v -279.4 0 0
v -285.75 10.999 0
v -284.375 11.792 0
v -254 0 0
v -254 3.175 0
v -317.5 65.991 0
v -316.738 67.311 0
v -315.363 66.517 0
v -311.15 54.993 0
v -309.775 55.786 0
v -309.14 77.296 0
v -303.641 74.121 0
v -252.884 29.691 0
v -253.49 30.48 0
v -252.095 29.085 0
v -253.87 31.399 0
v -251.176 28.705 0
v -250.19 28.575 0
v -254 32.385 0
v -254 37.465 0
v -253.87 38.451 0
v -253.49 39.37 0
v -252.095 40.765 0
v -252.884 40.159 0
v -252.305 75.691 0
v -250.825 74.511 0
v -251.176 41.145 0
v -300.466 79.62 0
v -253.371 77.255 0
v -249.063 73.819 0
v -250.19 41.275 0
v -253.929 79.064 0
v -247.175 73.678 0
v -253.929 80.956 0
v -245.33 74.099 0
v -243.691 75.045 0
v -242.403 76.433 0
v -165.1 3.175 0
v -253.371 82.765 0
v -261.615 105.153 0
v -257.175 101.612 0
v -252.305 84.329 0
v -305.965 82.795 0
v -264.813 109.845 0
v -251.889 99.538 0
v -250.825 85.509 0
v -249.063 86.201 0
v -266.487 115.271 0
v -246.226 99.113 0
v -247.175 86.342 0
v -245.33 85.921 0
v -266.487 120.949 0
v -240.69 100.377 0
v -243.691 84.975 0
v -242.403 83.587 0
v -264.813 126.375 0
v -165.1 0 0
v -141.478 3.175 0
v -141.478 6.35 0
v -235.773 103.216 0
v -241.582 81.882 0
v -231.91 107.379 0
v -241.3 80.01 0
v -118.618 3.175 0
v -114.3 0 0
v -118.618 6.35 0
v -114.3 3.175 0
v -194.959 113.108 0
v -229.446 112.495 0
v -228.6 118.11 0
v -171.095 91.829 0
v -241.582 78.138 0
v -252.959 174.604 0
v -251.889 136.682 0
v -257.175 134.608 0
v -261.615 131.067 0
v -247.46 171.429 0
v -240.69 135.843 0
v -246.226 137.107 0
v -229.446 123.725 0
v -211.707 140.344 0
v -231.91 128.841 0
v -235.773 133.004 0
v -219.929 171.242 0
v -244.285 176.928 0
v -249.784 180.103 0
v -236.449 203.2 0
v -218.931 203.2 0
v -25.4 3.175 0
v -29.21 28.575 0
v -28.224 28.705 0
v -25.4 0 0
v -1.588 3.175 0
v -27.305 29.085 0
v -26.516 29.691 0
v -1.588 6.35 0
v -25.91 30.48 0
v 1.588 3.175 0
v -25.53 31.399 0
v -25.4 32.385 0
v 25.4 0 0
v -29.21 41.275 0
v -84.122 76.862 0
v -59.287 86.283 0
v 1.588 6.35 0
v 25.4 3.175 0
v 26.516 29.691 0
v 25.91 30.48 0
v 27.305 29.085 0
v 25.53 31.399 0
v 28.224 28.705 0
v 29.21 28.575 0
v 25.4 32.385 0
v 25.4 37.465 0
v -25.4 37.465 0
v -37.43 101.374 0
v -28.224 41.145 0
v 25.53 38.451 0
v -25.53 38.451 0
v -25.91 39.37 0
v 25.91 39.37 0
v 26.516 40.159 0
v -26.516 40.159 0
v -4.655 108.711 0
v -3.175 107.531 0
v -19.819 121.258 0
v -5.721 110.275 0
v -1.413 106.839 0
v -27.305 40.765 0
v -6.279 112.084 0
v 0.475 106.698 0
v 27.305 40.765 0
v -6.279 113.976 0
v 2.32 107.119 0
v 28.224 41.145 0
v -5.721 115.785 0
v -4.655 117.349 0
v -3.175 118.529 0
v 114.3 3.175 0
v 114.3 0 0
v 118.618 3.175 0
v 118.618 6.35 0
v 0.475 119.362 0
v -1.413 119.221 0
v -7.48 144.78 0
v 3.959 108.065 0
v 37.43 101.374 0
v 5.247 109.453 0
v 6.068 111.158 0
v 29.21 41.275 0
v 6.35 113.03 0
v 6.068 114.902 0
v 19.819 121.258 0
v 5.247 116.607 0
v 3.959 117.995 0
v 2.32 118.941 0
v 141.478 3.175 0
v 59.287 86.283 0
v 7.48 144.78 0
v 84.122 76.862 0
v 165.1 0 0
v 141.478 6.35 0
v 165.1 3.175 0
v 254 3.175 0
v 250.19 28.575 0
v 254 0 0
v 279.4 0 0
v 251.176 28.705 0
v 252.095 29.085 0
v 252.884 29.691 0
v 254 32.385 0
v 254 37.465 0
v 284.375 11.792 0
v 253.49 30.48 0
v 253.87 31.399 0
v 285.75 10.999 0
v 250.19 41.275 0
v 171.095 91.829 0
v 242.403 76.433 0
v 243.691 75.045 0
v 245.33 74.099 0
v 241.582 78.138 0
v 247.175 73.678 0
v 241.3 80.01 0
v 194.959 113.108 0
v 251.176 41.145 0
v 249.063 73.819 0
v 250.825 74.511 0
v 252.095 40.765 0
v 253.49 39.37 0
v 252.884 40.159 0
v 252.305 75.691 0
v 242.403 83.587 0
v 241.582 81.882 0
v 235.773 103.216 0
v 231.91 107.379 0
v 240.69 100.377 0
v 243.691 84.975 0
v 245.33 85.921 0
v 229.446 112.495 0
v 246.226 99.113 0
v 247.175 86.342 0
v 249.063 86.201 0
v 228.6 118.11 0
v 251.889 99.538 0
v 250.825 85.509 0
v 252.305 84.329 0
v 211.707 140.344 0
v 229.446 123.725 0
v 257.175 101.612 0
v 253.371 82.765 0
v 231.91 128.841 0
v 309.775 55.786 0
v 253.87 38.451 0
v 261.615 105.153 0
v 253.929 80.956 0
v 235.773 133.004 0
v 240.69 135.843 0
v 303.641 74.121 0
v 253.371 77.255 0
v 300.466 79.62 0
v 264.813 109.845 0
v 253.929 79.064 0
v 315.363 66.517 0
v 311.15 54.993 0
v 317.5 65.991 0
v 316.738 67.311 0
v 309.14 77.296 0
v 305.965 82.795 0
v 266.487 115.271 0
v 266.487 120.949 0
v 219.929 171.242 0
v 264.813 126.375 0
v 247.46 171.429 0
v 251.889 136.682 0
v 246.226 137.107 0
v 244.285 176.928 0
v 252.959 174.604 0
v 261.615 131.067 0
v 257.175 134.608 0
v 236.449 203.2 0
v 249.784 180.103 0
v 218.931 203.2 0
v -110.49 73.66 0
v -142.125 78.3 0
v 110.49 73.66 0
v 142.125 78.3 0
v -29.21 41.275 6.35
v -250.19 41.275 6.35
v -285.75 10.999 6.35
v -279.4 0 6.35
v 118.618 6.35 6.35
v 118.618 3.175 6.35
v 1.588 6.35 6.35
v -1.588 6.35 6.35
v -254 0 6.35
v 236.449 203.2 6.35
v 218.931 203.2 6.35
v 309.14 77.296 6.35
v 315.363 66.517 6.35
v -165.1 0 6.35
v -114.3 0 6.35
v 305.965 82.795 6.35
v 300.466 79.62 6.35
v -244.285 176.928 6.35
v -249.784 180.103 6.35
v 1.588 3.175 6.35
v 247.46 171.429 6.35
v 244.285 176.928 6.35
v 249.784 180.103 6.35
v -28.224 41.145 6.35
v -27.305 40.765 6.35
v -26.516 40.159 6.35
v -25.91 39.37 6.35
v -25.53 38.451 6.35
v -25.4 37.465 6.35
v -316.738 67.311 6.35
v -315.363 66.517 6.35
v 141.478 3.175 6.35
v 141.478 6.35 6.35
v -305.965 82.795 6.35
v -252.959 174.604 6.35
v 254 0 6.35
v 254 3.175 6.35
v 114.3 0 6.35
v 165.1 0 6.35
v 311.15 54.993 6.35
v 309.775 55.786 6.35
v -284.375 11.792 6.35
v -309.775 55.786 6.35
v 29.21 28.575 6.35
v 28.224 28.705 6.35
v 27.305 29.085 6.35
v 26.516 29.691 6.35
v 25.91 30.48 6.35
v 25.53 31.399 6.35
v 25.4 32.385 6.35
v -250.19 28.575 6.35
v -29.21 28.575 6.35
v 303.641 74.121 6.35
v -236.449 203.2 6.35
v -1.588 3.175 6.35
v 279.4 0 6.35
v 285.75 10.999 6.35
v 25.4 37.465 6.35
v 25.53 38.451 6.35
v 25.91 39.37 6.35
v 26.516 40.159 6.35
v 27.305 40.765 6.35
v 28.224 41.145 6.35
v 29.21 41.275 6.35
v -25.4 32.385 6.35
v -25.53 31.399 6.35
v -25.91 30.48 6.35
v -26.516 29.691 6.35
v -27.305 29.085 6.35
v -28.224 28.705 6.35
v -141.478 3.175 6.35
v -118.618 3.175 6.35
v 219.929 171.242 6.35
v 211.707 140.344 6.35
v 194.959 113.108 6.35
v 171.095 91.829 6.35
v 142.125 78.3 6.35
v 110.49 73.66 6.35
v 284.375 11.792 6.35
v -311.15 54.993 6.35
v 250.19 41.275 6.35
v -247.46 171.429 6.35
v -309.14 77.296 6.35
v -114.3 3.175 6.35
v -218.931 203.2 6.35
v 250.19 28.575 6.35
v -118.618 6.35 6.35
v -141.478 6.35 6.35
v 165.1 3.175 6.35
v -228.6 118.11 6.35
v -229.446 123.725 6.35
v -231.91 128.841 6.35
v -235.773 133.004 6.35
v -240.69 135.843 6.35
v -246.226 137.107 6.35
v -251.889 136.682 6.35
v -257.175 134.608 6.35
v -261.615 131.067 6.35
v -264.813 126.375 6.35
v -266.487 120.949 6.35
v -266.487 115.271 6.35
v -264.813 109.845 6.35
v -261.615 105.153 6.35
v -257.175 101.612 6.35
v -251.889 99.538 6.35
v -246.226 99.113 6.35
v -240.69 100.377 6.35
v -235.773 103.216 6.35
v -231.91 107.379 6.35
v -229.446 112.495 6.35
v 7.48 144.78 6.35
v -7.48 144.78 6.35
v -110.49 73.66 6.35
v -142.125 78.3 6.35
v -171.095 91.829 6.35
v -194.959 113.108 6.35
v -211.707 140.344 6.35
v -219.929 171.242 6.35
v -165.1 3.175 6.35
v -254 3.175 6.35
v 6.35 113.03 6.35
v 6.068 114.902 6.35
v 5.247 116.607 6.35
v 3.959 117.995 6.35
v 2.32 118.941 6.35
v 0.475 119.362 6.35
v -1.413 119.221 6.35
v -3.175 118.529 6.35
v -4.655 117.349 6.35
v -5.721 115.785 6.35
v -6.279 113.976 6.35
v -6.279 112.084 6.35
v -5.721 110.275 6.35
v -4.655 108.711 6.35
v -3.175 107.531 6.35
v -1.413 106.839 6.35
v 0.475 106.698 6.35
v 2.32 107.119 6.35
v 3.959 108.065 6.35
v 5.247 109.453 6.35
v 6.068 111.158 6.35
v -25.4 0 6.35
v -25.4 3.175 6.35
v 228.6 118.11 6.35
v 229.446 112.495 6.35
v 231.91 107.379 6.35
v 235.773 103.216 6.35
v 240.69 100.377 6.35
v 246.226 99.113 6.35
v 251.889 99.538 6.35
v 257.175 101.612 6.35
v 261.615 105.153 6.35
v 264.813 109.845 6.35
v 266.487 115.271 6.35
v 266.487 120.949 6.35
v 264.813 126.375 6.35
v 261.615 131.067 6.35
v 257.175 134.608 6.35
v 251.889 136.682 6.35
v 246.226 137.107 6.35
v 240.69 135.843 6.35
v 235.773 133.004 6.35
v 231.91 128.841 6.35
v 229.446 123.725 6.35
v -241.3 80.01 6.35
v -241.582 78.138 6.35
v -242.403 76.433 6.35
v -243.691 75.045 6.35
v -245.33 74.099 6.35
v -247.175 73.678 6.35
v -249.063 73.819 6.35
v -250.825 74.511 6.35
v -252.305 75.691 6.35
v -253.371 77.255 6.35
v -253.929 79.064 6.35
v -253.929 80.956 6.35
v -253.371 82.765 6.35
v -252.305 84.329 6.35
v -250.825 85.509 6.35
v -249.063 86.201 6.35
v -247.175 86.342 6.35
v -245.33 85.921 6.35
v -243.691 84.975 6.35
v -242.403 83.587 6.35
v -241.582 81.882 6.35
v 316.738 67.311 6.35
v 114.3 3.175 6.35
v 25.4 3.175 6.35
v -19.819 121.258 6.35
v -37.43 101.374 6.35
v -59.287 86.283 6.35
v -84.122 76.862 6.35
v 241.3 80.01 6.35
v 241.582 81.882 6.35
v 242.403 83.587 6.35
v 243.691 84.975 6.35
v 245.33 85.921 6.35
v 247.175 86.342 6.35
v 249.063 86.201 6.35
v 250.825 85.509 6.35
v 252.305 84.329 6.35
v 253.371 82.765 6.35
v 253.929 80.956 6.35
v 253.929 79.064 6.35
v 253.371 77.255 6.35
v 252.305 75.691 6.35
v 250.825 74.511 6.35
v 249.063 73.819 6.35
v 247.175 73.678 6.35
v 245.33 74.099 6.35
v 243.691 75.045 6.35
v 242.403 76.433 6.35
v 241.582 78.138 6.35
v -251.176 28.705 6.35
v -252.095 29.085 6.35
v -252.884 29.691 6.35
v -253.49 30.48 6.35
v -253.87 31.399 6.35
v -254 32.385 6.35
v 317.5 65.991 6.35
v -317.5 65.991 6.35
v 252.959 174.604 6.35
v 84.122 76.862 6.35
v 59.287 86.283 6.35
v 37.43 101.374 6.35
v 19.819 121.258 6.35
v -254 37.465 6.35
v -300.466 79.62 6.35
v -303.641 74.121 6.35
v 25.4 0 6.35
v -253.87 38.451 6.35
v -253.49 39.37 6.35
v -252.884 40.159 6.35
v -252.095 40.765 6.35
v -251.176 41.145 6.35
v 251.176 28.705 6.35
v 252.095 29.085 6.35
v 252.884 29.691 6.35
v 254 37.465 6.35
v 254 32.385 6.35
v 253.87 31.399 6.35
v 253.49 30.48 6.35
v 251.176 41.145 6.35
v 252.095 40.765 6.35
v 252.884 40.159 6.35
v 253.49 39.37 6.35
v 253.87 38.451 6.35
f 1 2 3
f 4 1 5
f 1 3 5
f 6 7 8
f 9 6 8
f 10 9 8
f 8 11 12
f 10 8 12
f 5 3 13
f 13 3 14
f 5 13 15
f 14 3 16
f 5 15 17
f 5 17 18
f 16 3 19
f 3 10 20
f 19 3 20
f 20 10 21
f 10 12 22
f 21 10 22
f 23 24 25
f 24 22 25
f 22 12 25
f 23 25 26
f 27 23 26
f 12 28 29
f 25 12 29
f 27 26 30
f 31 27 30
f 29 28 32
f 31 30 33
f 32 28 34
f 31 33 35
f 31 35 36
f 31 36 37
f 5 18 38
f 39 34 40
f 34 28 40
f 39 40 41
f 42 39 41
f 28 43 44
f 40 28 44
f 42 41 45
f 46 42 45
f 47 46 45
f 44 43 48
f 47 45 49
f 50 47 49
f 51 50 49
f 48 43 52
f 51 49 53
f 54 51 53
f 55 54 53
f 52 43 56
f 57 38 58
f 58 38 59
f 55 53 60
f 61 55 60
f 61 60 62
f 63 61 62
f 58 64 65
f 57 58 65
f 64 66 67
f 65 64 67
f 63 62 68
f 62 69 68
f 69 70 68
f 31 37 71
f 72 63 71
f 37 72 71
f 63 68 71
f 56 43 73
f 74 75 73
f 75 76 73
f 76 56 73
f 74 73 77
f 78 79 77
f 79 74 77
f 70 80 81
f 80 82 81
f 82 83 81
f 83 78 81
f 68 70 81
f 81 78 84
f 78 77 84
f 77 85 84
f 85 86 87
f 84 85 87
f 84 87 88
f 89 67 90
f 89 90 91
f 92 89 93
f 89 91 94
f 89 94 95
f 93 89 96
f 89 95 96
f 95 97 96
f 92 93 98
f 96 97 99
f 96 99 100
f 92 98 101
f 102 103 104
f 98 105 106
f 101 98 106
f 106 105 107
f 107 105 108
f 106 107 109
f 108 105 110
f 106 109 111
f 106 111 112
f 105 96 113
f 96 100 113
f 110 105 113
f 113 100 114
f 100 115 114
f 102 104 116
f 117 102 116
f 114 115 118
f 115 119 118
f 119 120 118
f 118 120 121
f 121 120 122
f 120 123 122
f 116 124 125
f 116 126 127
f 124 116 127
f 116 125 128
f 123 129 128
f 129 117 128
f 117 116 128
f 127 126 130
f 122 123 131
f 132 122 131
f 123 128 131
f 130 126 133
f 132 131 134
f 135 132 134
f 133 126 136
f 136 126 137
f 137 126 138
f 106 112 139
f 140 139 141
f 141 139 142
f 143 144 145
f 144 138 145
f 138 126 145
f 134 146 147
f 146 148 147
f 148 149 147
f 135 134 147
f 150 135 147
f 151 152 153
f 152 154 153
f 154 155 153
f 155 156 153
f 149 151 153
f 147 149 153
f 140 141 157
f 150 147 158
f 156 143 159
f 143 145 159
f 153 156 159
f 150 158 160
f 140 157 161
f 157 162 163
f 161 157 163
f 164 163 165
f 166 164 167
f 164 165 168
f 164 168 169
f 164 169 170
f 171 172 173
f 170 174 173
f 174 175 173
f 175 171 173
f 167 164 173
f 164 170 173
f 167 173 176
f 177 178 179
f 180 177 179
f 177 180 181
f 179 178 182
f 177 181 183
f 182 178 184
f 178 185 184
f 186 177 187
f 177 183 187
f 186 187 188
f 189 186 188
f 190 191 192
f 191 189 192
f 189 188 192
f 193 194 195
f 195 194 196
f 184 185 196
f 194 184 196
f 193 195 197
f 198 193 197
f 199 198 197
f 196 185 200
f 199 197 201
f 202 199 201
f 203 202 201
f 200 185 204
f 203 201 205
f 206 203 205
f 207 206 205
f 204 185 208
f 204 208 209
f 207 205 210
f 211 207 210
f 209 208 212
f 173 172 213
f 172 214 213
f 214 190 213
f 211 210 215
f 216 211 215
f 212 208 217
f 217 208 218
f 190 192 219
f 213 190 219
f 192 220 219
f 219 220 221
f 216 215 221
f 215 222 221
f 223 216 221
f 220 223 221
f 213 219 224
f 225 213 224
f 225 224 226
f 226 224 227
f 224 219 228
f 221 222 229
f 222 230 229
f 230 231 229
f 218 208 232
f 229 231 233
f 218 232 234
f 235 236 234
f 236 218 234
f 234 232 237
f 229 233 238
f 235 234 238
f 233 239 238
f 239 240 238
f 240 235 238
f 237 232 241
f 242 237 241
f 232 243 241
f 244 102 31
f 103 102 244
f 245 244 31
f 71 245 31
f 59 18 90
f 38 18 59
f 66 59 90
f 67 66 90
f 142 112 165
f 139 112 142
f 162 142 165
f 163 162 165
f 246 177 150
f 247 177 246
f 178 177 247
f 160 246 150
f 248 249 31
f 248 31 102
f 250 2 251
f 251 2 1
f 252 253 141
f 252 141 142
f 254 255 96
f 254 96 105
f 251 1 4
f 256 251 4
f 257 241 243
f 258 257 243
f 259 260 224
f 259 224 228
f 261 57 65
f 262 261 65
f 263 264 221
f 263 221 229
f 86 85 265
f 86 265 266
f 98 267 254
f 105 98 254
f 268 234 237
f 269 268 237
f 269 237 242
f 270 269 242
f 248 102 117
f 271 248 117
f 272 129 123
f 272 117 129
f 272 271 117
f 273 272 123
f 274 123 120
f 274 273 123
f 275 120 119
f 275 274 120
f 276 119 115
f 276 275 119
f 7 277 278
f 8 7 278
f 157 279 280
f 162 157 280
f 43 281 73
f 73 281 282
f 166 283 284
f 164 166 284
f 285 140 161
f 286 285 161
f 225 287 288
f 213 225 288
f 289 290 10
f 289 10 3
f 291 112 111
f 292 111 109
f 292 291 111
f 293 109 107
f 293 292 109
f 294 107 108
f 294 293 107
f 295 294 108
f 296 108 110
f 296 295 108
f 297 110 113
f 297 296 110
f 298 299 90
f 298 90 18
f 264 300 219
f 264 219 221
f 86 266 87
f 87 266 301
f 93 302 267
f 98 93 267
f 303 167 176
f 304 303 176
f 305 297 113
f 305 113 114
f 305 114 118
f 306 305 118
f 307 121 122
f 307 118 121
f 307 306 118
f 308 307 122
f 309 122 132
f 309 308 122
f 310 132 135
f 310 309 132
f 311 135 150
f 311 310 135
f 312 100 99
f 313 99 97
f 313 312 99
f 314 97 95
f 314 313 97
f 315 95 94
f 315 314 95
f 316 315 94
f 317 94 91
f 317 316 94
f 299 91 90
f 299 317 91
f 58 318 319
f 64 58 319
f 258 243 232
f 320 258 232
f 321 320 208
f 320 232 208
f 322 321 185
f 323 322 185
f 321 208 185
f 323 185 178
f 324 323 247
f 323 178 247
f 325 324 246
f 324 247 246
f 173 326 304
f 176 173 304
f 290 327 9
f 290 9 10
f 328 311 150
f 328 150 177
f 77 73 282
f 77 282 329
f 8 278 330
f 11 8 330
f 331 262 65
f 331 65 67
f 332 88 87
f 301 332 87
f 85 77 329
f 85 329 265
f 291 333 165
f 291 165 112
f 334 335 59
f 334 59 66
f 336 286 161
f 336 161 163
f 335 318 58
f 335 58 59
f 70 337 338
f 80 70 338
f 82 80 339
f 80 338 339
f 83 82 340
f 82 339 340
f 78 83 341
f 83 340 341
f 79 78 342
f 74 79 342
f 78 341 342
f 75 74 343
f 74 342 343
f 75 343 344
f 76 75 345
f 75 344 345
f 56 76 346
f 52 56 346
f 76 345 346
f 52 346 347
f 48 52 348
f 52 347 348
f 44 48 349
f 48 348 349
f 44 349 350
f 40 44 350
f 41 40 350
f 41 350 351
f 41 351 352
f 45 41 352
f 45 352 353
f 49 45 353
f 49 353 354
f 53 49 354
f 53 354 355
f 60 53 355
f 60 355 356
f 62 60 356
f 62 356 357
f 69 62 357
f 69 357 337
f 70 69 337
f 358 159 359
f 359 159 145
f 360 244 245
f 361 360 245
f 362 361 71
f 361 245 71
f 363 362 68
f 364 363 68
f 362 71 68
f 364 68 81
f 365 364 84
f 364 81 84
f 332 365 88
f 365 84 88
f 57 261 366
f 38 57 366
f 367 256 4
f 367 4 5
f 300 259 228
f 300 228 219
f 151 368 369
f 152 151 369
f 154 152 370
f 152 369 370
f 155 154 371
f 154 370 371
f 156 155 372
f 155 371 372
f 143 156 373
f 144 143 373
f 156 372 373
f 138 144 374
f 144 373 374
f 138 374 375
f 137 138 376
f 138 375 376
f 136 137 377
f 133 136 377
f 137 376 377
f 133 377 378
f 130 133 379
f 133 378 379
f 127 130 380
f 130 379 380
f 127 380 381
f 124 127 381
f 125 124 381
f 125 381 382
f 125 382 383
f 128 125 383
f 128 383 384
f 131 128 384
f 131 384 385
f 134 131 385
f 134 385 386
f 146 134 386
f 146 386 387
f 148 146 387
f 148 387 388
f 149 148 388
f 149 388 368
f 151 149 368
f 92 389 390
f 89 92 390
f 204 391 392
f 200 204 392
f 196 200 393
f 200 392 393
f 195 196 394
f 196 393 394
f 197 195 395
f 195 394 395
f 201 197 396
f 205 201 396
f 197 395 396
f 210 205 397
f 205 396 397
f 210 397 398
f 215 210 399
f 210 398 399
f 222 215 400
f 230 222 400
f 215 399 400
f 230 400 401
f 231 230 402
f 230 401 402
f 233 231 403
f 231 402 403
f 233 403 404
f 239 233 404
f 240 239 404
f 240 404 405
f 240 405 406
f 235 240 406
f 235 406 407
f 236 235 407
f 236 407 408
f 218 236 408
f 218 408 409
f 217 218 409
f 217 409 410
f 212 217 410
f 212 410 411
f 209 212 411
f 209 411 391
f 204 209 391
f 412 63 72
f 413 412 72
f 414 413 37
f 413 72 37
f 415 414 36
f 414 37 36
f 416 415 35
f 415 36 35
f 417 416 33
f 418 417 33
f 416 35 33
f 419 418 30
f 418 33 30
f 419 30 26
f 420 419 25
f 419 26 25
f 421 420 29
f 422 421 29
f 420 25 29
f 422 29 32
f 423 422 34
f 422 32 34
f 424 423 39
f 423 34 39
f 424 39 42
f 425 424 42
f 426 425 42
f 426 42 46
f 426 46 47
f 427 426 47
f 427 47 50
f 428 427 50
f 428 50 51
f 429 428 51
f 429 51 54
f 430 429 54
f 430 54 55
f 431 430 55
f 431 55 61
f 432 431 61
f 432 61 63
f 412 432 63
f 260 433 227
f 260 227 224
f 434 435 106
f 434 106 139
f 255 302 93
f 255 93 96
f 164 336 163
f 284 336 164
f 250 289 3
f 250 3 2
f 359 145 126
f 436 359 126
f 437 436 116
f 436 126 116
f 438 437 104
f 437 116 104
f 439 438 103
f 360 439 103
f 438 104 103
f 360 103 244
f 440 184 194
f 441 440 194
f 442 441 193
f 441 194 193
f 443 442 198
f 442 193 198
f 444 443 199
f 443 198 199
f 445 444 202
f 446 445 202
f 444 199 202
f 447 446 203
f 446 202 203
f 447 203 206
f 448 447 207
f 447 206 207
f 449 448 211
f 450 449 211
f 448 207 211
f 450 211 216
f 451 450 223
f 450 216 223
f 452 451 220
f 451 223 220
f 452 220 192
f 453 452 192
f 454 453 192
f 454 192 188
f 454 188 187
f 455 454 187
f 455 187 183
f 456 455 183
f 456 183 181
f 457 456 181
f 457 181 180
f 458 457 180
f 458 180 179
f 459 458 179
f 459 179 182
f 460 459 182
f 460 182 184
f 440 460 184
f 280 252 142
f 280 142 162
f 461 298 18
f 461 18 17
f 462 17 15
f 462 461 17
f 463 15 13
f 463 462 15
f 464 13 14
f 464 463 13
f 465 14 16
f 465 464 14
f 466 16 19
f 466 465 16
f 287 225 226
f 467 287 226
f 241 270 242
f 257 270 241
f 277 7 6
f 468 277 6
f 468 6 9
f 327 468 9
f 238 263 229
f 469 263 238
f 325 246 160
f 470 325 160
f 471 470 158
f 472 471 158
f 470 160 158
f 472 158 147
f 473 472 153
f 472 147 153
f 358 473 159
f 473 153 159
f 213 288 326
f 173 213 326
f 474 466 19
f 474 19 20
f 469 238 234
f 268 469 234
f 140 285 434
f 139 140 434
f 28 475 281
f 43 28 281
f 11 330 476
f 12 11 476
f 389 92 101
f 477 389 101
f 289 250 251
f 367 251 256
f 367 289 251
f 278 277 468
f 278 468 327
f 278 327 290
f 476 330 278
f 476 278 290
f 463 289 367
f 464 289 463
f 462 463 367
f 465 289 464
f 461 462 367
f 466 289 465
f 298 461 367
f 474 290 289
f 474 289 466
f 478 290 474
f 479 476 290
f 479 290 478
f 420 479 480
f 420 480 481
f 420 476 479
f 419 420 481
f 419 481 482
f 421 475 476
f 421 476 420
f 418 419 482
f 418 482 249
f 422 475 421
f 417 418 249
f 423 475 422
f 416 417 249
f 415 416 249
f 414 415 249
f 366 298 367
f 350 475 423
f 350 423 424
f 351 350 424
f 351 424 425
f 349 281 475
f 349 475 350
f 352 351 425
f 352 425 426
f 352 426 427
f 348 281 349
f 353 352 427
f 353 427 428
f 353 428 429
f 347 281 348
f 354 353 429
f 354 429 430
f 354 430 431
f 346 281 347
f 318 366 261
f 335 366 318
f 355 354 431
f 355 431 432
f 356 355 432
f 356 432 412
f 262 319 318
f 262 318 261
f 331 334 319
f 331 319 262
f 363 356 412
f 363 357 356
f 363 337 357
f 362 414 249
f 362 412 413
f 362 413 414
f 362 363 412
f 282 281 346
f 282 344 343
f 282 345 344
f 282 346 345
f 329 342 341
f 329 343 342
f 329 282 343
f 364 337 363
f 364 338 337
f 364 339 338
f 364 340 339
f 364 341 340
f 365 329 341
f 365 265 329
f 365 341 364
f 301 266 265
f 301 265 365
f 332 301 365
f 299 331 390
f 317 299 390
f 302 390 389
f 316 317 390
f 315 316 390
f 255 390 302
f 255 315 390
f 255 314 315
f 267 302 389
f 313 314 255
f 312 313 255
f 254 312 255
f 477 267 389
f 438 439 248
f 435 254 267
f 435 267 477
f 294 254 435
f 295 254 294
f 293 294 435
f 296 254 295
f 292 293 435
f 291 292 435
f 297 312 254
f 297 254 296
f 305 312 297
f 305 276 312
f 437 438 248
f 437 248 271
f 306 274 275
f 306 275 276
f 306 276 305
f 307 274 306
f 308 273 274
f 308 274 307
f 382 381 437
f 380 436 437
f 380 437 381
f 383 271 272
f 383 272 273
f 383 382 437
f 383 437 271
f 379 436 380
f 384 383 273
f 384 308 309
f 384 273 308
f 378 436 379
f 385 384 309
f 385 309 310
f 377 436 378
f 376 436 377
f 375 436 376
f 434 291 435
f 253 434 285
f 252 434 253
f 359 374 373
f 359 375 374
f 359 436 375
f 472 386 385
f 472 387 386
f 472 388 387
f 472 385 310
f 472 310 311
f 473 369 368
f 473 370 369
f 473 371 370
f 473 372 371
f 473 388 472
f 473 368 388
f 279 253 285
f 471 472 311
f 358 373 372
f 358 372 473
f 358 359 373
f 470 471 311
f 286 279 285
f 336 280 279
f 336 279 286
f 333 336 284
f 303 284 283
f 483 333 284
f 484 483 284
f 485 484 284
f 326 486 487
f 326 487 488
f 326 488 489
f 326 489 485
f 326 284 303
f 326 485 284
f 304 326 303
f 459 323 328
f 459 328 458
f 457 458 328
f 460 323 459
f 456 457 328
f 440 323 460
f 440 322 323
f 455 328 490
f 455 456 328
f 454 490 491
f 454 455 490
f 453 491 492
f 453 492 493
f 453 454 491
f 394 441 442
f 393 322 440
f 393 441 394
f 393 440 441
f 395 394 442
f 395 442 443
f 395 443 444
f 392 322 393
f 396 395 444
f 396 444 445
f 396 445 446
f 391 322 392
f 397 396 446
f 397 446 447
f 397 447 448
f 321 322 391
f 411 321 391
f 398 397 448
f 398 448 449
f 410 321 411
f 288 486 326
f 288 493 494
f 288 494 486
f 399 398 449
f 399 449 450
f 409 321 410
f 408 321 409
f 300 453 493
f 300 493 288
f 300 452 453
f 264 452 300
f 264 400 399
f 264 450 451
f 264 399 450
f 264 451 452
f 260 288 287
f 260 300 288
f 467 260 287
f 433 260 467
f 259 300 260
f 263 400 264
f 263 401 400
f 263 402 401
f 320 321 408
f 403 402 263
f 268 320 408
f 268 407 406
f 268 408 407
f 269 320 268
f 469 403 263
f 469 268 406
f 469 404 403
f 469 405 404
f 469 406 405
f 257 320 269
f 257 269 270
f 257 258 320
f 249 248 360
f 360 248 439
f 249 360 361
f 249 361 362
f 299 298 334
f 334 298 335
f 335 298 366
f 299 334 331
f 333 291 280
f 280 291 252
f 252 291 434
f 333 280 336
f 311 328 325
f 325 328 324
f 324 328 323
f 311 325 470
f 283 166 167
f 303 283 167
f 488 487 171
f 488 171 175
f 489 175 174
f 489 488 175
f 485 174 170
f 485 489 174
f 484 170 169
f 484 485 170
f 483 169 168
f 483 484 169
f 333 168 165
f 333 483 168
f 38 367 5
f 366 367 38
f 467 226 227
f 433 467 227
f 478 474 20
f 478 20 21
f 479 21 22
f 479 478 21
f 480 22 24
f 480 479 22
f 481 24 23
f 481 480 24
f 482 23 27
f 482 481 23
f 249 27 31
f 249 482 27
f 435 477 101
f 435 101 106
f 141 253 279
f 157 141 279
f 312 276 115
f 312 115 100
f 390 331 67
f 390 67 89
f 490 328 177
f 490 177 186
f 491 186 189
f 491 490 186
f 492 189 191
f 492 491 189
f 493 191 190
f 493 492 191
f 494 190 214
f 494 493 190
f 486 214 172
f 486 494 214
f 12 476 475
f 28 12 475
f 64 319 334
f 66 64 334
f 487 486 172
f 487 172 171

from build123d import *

# Parameters (mm, degrees)
BOSS_EXTRUDE1_DEPTH       = 6.35
SKETCH4_W                 = 88.9
SKETCH4_H                 = 3.175
CUT_EXTRUDE1_DEPTH        = 378.010361263
CUT_EXTRUDE2_DEPTH        = 378.010361263
CUT_EXTRUDE5_DEPTH        = 378.010361263
CUT_EXTRUDE6_DEPTH        = 378.010361263
SKETCH12_W                = 22.86
SKETCH12_H                = 3.175
SKETCH12_W_2              = 3.175
CUT_EXTRUDE8_DEPTH        = 378.010361263
NYLON_BOLT_CUT_REACH      = 379.01
SKETCH13_R                = 6.35
SKETCH14_R                = 19.05
CUT_EXTRUDE9_DEPTH        = 378.010361263
SKETCH15_R                = 6.35
STATIC_PAYLOAD_BOLT_DEPTH = 378.010361263
CUT_EXTRUDE10_DEPTH       = 378.010361263


with BuildPart() as part:
    # Sketch3 → Boss-Extrude1 (new body)
    with BuildSketch(Plane.XY):
        with BuildLine():
            Line((-317.5, 65.991135768), (-279.4, 0))
            Line((-279.4, 0), (279.4, 0))
            Line((279.4, 0), (317.5, 65.991135768))
            Line((317.5, 65.991135768), (238.282425301, 203.2))
            Line((238.282425301, 203.2), (218.930796924, 203.2))
            ThreePointArc((218.930796924, 203.2), (194.958955891, 113.108264062), (110.49, 73.66))
            ThreePointArc((110.49, 73.66), (47.902002926, 93.167184987), (7.48041253, 144.78))
            Line((7.48041253, 144.78), (-7.48041253, 144.78))
            ThreePointArc((-7.48041253, 144.78), (-47.902002926, 93.167184987), (-110.49, 73.66))
            ThreePointArc((-110.49, 73.66), (-194.958955891, 113.108264062), (-218.930796924, 203.2))
            Line((-218.930796924, 203.2), (-238.282425301, 203.2))
            Line((-238.282425301, 203.2), (-317.5, 65.991135768))
        make_face()
    extrude(amount=BOSS_EXTRUDE1_DEPTH)

    # Sketch4 → Cut-Extrude1 (cut, through all)
    with BuildSketch(Plane.XY.offset(6.35)):
        with Locations((-209.55, 1.5875)):
            Rectangle(SKETCH4_W, SKETCH4_H)
        with Locations((-69.85, 1.5875)):
            Rectangle(SKETCH4_W, SKETCH4_H)
        with Locations((69.85, 1.5875)):
            Rectangle(SKETCH4_W, SKETCH4_H)
        with Locations((209.55, 1.5875)):
            Rectangle(SKETCH4_W, SKETCH4_H)
    extrude(amount=-CUT_EXTRUDE1_DEPTH, mode=Mode.SUBTRACT)

    # Sketch5 → Cut-Extrude2 (cut, through all)
    with BuildSketch(Plane.XY.offset(6.35)):
        Polygon((-311.15, 54.99261314), (-309.775184671, 55.78636314), (-284.375184671, 11.792272628), (-285.75, 10.998522628), align=None)
        Polygon((285.75, 10.998522628), (311.15, 54.99261314), (309.775184671, 55.78636314), (284.375184671, 11.792272628), align=None)
    extrude(amount=-CUT_EXTRUDE2_DEPTH, mode=Mode.SUBTRACT)

    # Sketch8 → Cut-Extrude5 (cut, through all)
    with BuildSketch(Plane.XY.offset(6.35)):
        Polygon((-315.363184671, 66.517208484), (-236.449338196, 203.2), (-238.282425301, 203.2), (-316.738, 67.310958484), align=None)
        Polygon((316.738, 67.310958484), (315.363184671, 66.517208484), (236.449338196, 203.2), (238.282425301, 203.2), align=None)
    extrude(amount=-CUT_EXTRUDE5_DEPTH, mode=Mode.SUBTRACT)

    # Sketch9 → Cut-Extrude6 (cut, through all)
    with BuildSketch(Plane.XY.offset(6.35)):
        Polygon((-252.959338196, 174.603841167), (-247.460076882, 171.428841167), (-244.285076882, 176.928102481), (-249.784338196, 180.103102481), align=None)
        Polygon((249.784338196, 180.103102481), (252.959338196, 174.603841167), (247.460076882, 171.428841167), (244.285076882, 176.928102481), align=None)
        Polygon((-303.640923357, 74.120760659), (-300.465923357, 79.620021973), (-305.965184671, 82.795021973), (-309.140184671, 77.295760659), align=None)
        Polygon((305.965184671, 82.795021973), (309.140184671, 77.295760659), (303.640923357, 74.120760659), (300.465923357, 79.620021973), align=None)
    extrude(amount=-CUT_EXTRUDE6_DEPTH, mode=Mode.SUBTRACT)

    # Sketch12 → Cut-Extrude8 (cut, through all)
    with BuildSketch(Plane.XY.offset(6.35)):
        with Locations((-130.048, 4.7625)):
            Rectangle(SKETCH12_W, SKETCH12_H)
        with Locations((130.048, 4.7625)):
            Rectangle(SKETCH12_W, SKETCH12_H)
        with Locations((0, 4.7625)):
            Rectangle(SKETCH12_W_2, SKETCH12_H)
    extrude(amount=-CUT_EXTRUDE8_DEPTH, mode=Mode.SUBTRACT)

    # Sketch13 → nylon bolt cut (cut, up to next)
    with BuildSketch(Plane(origin=(0, 0, 0), x_dir=(-1, 0, 0), z_dir=(0, 0, -1)), mode=Mode.PRIVATE) as nylon_bolt_cut_sk1:
        with Locations((-247.65, 80.01)):
            Circle(SKETCH13_R)
    nylon_bolt_cut_tool1 = extrude(nylon_bolt_cut_sk1.sketch, amount=-NYLON_BOLT_CUT_REACH, mode=Mode.PRIVATE) & part.part
    # Sketch13 → nylon bolt cut (cut, up to next)
    with BuildSketch(Plane(origin=(0, 0, 0), x_dir=(-1, 0, 0), z_dir=(0, 0, -1)), mode=Mode.PRIVATE) as nylon_bolt_cut_sk2:
        with Locations(Location((247.65, 80.01, 0), (0, 0, 180))):
            Circle(SKETCH13_R)
    nylon_bolt_cut_tool2 = extrude(nylon_bolt_cut_sk2.sketch, amount=-NYLON_BOLT_CUT_REACH, mode=Mode.PRIVATE) & part.part
    add(nylon_bolt_cut_tool1.solids().sort_by_distance((247.65, 80.01, 0))[0], mode=Mode.SUBTRACT)
    add(nylon_bolt_cut_tool2.solids().sort_by_distance((-247.65, 80.01, 0))[0], mode=Mode.SUBTRACT)

    # Sketch14 → Cut-Extrude9 (cut, through all)
    with BuildSketch(Plane.XY.offset(6.35)):
        with Locations((-247.65, 118.11)):
            Circle(SKETCH14_R)
        with Locations(Location((247.65, 118.11, 0), (0, 0, 180))):
            Circle(SKETCH14_R)
    extrude(amount=-CUT_EXTRUDE9_DEPTH, mode=Mode.SUBTRACT)

    # Sketch15 → static payload bolt (cut, through all)
    with BuildSketch(Plane.XY.offset(6.35)):
        with Locations((0, 113.03)):
            Circle(SKETCH15_R)
    extrude(amount=-STATIC_PAYLOAD_BOLT_DEPTH, mode=Mode.SUBTRACT)

    # Sketch16 → Cut-Extrude10 (cut, through all)
    with BuildSketch(Plane.XY.offset(6.35)):
        with BuildLine():
            Line((-250.19, 41.275), (-29.21, 41.275))
            ThreePointArc((-29.21, 41.275), (-26.515923164, 40.159076836), (-25.4, 37.465))
            Line((-25.4, 37.465), (-25.4, 32.385))
            ThreePointArc((-25.4, 32.385), (-26.515923164, 29.690923164), (-29.21, 28.575))
            Line((-29.21, 28.575), (-250.19, 28.575))
            ThreePointArc((-250.19, 28.575), (-252.884076836, 29.690923164), (-254, 32.385))
            Line((-254, 32.385), (-254, 37.465))
            ThreePointArc((-254, 37.465), (-252.884076836, 40.159076836), (-250.19, 41.275))
        make_face()
        with BuildLine():
            Line((254, 37.465), (254, 32.385))
            ThreePointArc((254, 32.385), (252.884076836, 29.690923164), (250.19, 28.575))
            Line((250.19, 28.575), (29.21, 28.575))
            ThreePointArc((29.21, 28.575), (26.515923164, 29.690923164), (25.4, 32.385))
            Line((25.4, 32.385), (25.4, 37.465))
            ThreePointArc((25.4, 37.465), (26.515923164, 40.159076836), (29.21, 41.275))
            Line((29.21, 41.275), (250.19, 41.275))
            ThreePointArc((250.19, 41.275), (252.884076836, 40.159076836), (254, 37.465))
        make_face()
    extrude(amount=-CUT_EXTRUDE10_DEPTH, mode=Mode.SUBTRACT)


solid = part.part
